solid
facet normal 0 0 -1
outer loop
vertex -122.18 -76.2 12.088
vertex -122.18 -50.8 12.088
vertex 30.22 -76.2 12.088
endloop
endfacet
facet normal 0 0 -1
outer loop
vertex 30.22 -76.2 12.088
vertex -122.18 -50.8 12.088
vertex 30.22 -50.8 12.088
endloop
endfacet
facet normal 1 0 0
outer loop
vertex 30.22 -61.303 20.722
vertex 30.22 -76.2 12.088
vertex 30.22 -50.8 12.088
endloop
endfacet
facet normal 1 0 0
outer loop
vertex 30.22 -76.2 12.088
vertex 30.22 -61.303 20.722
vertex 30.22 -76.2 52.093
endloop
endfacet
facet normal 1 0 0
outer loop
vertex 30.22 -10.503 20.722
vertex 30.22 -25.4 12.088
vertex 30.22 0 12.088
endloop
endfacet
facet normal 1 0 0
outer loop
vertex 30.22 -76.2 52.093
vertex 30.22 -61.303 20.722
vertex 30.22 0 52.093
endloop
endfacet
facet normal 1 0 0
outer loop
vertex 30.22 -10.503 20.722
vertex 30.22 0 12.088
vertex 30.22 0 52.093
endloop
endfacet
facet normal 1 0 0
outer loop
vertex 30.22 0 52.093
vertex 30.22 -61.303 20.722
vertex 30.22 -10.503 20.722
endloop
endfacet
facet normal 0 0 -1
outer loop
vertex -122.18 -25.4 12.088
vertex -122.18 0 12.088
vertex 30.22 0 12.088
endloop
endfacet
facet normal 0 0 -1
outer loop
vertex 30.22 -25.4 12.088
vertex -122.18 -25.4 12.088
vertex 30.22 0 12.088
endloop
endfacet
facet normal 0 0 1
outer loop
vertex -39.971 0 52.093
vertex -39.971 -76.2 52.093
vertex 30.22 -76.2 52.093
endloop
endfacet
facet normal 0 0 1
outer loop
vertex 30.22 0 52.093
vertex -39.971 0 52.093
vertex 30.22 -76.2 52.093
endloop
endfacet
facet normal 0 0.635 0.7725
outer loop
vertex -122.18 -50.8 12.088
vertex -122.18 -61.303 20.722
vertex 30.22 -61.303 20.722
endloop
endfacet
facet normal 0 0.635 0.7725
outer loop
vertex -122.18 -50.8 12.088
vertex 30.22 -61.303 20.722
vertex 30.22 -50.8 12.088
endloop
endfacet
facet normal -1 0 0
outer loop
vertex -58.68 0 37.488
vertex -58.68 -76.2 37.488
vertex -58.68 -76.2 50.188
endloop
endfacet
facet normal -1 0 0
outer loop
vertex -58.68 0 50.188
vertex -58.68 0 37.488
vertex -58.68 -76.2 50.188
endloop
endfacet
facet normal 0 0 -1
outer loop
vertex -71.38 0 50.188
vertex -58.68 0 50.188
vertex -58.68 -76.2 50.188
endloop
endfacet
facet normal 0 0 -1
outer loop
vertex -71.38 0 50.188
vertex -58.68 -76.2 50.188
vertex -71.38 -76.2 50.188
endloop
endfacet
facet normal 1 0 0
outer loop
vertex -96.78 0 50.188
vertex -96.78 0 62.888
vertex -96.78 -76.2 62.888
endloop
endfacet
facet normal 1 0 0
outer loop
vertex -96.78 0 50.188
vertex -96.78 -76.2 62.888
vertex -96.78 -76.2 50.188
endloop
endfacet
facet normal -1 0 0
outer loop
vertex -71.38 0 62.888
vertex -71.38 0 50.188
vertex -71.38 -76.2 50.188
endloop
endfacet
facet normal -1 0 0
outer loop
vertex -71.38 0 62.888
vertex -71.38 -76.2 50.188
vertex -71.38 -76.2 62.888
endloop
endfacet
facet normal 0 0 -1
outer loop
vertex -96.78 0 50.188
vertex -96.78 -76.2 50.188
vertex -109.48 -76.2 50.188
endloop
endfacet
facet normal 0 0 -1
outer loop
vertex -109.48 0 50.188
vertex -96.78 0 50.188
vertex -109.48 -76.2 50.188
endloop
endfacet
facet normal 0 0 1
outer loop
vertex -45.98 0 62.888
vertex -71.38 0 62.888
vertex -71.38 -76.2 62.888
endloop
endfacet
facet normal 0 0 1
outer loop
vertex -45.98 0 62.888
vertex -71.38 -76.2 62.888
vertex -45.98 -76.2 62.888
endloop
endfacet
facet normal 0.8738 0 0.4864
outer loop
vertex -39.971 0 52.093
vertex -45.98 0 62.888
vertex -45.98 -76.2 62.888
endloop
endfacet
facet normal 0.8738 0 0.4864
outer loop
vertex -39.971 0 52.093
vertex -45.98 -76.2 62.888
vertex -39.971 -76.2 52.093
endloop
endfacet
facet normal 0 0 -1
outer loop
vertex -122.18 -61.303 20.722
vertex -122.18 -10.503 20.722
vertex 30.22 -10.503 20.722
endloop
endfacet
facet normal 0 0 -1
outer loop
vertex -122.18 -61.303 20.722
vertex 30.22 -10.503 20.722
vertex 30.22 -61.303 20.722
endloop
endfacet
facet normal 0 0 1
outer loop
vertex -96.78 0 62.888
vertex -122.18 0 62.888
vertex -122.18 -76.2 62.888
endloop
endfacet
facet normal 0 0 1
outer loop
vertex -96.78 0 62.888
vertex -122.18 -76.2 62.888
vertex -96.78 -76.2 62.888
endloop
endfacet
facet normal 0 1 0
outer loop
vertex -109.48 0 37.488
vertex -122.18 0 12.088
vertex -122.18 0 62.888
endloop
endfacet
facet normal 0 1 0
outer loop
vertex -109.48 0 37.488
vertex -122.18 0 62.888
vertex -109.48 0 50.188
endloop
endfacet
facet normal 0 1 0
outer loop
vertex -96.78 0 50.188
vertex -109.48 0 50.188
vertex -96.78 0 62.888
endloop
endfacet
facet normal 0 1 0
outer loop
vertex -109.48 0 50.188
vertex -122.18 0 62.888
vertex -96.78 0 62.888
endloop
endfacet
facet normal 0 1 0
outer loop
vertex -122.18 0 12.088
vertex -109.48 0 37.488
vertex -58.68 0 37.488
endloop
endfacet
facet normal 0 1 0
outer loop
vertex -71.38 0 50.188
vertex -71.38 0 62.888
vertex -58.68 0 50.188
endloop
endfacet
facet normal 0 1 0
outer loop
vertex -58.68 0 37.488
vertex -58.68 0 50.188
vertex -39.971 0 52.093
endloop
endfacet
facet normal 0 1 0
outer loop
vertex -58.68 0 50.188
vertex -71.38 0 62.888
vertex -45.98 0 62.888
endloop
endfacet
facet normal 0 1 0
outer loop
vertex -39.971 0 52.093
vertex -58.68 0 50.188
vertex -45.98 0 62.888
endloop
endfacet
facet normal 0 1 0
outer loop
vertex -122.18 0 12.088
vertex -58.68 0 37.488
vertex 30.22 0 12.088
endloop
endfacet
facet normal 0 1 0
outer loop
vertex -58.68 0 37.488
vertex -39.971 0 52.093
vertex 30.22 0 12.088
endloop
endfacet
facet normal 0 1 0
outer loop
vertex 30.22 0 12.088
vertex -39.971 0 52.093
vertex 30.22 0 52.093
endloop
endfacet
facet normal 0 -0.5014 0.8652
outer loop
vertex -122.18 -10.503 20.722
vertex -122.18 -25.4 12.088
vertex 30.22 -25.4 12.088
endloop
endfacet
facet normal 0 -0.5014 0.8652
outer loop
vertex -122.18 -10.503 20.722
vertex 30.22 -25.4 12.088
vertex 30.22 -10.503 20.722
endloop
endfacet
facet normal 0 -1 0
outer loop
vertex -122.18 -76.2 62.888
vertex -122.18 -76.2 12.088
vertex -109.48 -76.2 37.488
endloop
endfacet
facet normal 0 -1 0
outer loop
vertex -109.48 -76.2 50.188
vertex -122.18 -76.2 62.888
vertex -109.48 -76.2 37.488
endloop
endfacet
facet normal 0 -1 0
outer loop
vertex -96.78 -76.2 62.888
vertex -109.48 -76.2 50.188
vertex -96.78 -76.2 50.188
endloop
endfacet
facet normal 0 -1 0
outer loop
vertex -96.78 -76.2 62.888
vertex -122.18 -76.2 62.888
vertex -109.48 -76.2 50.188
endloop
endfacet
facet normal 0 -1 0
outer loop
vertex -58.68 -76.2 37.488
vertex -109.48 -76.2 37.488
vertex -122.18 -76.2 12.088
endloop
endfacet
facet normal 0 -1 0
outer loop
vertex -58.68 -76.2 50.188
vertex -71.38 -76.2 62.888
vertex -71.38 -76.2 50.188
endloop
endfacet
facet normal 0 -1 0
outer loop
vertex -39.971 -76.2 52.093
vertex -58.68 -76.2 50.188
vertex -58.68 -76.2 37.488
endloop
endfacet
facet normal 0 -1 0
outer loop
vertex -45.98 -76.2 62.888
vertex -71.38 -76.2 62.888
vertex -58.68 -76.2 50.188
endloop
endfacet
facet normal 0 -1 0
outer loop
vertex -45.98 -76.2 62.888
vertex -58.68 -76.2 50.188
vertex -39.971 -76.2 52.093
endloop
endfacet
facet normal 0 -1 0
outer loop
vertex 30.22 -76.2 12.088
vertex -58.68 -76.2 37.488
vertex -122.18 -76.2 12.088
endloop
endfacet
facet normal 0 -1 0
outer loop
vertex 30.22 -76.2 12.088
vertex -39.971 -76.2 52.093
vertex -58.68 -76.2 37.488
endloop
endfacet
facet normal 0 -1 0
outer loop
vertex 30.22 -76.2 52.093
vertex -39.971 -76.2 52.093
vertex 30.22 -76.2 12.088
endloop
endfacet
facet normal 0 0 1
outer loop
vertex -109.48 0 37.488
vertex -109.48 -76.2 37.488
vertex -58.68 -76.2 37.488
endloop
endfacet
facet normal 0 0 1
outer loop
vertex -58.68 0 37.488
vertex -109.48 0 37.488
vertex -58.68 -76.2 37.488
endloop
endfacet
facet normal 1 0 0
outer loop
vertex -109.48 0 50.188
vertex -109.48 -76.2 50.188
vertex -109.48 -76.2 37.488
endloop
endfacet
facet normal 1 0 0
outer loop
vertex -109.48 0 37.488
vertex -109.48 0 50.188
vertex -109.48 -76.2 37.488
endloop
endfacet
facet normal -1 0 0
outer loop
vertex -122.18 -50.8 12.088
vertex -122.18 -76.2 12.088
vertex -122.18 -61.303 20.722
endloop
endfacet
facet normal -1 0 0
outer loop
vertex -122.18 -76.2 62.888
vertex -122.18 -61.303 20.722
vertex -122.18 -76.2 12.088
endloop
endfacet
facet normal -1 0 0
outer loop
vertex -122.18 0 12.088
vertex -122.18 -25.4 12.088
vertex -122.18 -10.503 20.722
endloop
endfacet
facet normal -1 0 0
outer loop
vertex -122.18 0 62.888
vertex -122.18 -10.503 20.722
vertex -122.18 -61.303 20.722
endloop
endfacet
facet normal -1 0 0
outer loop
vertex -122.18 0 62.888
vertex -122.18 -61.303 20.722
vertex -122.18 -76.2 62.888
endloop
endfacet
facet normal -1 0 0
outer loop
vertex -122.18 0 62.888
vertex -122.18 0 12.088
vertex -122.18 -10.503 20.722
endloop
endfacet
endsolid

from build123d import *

# Parameters (mm, degrees)
F0_W     = 152.4
F0_H     = 50.8
F1_DEPTH = 76.2
F3_DEPTH = 76.201
F5_DEPTH = 76.201
F7_DEPTH = 152.401


with BuildPart() as f1:
    # F0 (on Front) → F1 (new body)
    with BuildSketch(Plane.XZ):
        with Locations((-45.980399, 37.487842)):
            Rectangle(F0_W, F0_H)
    extrude(amount=F1_DEPTH)

    # F2 (on face) → F3 (cut, through all)
    with BuildSketch(Plane.XZ.offset(76.2)):
        Polygon((-71.380399, 62.887842), (-96.780399, 62.887842), (-96.780399, 50.187842), (-109.480399, 50.187842), (-109.480399, 37.487842), (-58.680399, 37.487842), (-58.680399, 50.187842), (-71.380399, 50.187842), align=None)
    extrude(amount=-F3_DEPTH, mode=Mode.SUBTRACT)

    # F4 (on face) → F5 (cut, through all)
    with BuildSketch(Plane.XZ.offset(76.2)):
        Polygon((30.219601, 62.887842), (-45.980399, 62.887842), (-39.970737, 52.092843), (30.219601, 52.092843), align=None)
    extrude(amount=-F5_DEPTH, mode=Mode.SUBTRACT)

    # F6 (on face) → F7 (cut, through all)
    with BuildSketch(Plane.YZ.offset(30.219601)):
        Polygon((-61.302628, 20.722013), (-50.8, 12.087842), (-25.4, 12.087842), (-10.502628, 20.722013), align=None)
    extrude(amount=-F7_DEPTH, mode=Mode.SUBTRACT)


solid = f1.part
